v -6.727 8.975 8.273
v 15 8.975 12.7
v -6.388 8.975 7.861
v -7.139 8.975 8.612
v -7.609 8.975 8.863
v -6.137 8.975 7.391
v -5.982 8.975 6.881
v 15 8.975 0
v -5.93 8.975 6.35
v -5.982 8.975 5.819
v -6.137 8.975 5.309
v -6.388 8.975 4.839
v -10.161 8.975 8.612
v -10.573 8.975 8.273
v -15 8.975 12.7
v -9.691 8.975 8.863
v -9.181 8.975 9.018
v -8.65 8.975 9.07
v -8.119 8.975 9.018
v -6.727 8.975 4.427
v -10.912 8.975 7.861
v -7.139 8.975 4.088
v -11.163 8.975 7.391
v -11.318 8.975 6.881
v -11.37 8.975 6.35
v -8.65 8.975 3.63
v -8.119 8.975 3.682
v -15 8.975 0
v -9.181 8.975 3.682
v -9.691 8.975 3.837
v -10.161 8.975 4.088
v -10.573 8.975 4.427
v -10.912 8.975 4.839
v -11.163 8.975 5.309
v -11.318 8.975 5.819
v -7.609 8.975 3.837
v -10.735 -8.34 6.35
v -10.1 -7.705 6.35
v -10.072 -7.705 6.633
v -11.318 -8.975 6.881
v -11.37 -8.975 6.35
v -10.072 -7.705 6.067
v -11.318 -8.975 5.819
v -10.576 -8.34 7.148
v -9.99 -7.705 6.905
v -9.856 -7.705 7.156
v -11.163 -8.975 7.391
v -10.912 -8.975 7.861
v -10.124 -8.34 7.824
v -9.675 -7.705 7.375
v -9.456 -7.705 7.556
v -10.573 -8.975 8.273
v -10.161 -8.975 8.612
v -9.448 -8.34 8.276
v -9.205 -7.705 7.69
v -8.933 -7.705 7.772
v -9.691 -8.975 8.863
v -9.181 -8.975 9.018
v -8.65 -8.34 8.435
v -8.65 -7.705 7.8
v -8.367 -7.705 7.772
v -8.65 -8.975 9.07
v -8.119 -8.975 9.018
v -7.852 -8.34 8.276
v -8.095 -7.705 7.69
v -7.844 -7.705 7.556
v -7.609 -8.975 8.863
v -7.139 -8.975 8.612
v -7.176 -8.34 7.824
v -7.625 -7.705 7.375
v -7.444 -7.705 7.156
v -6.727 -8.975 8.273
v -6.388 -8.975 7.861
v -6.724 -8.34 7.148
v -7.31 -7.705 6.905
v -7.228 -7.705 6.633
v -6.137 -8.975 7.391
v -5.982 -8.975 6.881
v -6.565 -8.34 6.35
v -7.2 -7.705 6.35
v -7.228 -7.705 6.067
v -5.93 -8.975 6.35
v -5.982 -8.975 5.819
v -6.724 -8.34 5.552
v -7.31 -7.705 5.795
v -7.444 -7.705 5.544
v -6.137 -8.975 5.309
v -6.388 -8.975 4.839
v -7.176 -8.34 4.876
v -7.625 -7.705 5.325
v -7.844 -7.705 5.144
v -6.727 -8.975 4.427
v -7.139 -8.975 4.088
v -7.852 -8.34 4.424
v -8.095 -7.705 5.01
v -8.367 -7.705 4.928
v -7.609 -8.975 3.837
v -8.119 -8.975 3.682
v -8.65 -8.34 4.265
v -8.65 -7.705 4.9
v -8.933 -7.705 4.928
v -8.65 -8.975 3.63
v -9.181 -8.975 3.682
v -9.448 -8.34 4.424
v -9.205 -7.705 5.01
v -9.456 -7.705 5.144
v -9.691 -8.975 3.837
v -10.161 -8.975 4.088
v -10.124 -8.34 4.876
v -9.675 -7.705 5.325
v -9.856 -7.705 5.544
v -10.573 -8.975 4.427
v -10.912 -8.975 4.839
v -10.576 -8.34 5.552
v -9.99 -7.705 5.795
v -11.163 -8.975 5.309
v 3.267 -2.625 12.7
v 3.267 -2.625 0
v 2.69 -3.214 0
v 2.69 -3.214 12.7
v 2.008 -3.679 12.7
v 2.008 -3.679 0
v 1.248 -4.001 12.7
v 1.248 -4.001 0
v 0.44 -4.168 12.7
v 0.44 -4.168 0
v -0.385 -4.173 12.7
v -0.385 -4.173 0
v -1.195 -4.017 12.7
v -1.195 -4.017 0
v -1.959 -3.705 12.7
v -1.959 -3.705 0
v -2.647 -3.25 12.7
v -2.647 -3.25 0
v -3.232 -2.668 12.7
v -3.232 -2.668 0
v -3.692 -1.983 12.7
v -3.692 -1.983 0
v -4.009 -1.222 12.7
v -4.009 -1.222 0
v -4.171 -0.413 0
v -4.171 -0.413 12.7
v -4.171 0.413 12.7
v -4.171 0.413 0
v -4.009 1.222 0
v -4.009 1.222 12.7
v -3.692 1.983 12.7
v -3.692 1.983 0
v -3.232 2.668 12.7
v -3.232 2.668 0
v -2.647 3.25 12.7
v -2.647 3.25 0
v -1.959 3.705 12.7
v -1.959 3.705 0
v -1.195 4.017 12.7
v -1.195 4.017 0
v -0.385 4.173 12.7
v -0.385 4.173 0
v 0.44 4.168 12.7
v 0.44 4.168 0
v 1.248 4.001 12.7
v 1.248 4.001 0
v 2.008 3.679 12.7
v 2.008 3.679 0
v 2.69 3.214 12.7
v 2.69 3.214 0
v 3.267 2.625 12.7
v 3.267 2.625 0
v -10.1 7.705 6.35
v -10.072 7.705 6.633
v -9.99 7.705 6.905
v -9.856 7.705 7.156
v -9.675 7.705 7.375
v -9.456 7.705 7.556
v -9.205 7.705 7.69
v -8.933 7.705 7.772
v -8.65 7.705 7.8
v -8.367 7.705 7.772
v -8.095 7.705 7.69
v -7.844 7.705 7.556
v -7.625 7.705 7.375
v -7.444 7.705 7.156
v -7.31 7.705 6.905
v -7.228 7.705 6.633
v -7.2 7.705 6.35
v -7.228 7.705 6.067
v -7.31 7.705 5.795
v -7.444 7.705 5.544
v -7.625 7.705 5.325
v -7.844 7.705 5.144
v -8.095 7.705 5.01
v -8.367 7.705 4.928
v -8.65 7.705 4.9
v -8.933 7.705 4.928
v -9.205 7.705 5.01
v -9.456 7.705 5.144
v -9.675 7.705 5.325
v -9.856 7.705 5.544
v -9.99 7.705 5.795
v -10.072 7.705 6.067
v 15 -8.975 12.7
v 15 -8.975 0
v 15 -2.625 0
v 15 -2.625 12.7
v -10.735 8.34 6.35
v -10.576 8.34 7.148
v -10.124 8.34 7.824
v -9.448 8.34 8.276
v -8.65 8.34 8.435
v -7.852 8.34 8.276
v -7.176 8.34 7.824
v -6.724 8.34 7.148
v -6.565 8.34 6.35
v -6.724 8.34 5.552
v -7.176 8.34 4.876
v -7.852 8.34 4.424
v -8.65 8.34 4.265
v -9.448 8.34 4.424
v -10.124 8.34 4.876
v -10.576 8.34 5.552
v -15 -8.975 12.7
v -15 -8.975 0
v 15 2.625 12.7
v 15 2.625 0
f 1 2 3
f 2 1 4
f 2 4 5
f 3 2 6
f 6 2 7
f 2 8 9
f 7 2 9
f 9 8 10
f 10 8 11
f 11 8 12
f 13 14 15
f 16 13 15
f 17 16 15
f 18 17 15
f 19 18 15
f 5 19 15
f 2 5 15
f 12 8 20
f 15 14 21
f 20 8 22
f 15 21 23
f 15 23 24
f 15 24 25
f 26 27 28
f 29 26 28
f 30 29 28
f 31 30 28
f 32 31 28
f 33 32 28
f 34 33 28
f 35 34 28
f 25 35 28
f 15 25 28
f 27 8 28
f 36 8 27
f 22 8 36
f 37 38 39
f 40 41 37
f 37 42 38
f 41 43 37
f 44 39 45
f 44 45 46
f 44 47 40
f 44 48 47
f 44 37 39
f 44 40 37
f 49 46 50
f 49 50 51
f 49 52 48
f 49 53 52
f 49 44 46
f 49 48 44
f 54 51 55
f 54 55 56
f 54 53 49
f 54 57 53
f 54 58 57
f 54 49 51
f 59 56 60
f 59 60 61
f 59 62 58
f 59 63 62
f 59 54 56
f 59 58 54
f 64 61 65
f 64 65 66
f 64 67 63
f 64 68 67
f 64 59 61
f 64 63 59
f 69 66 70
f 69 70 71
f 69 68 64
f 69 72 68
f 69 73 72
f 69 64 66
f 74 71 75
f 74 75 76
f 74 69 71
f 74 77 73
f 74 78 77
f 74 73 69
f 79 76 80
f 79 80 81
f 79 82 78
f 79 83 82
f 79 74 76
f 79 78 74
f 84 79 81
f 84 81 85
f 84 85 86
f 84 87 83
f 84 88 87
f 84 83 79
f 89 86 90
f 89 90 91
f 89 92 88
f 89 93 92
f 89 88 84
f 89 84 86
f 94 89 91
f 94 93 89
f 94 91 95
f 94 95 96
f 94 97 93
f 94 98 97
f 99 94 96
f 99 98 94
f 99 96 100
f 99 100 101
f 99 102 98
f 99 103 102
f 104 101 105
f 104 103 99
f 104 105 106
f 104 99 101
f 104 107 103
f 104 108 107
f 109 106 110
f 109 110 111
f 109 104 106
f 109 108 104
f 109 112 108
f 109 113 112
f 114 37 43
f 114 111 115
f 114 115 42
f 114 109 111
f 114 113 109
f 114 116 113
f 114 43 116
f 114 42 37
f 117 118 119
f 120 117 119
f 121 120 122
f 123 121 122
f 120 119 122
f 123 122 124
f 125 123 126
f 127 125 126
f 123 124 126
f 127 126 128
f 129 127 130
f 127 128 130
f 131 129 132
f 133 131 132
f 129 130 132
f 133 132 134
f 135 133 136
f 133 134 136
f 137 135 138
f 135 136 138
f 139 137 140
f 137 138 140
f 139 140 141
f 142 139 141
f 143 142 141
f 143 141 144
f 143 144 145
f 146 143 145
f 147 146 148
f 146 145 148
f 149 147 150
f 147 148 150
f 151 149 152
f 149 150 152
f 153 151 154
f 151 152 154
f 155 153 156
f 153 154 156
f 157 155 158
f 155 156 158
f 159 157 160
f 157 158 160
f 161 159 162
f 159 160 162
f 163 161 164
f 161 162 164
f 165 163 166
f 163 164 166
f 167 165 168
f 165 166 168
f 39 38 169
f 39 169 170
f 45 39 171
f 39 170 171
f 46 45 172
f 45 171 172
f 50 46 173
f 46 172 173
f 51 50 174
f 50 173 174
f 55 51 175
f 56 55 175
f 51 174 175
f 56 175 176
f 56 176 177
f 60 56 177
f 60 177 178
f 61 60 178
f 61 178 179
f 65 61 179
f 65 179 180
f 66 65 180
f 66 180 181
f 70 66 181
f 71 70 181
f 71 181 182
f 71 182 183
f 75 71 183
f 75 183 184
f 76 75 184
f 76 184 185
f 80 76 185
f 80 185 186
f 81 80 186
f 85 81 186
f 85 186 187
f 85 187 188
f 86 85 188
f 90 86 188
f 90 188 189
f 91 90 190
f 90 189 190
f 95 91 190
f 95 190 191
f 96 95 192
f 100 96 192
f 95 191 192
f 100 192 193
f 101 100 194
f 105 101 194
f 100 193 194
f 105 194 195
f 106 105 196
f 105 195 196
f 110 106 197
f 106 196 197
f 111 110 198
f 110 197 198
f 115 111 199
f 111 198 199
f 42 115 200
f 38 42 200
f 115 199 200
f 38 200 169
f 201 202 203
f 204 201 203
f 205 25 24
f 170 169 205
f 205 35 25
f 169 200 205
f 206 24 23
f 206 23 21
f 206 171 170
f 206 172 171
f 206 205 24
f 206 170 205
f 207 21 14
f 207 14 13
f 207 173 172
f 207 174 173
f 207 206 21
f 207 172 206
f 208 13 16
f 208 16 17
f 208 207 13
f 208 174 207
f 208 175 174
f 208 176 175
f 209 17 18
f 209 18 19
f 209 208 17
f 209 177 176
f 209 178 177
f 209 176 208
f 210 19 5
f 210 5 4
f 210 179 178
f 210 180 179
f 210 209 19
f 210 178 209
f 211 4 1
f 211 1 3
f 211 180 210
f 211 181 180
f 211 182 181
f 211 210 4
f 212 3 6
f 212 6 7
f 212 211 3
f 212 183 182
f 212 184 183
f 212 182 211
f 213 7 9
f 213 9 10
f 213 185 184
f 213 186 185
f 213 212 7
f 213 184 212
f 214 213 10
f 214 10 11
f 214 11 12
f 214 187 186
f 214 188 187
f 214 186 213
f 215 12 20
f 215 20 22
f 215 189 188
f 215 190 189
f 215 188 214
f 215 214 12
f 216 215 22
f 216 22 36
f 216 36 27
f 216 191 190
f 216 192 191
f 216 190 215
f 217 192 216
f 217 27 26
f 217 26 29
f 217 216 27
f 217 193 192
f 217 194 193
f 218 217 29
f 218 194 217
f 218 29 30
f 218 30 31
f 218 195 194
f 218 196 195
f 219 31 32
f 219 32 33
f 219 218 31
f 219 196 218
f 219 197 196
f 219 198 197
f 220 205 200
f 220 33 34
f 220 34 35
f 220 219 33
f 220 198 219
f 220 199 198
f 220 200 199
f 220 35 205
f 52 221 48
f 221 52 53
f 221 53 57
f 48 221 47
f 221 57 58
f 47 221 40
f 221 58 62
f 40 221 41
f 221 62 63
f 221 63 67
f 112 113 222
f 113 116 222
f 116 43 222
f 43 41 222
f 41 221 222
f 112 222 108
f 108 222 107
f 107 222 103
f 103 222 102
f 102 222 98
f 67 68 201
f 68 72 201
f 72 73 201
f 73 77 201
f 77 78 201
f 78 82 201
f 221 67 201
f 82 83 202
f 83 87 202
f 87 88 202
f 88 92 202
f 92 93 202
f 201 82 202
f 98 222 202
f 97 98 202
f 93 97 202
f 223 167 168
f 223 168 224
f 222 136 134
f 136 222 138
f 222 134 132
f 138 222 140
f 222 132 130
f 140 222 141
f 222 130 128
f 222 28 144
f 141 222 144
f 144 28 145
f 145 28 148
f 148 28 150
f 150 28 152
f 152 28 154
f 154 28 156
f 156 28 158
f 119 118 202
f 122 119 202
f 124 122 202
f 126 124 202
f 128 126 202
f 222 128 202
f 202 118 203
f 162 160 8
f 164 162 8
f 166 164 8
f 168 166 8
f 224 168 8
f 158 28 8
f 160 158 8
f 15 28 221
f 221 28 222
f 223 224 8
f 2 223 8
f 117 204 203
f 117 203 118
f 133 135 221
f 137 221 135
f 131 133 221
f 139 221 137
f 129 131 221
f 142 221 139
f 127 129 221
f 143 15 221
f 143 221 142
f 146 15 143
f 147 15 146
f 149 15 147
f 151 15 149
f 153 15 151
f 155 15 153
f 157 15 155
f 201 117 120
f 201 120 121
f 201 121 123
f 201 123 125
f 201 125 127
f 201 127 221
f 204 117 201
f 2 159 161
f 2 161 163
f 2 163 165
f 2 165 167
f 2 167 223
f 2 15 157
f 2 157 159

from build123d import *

# Parameters (mm, degrees)
F1_DEPTH = 12.7
F2_R     = 1.45
F3_DEPTH = 29.2862
F4_SIZE  = 1.27


with BuildPart() as f1:
    # F0 (on Top) → F1 (new body)
    with BuildSketch(Plane.XY):
        with BuildLine():
            Line((15, 2.625), (15, 8.975))
            Line((15, 8.975), (-15, 8.975))
            Line((-15, 8.975), (-15, -8.975))
            Line((-15, -8.975), (15, -8.975))
            Line((15, -8.975), (15, -2.625))
            Line((15, -2.625), (3.267087, -2.625))
            ThreePointArc((3.267087, -2.625), (-4.191, 0), (3.267087, 2.625))
            Line((3.267087, 2.625), (15, 2.625))
        make_face()
    extrude(amount=F1_DEPTH)

    # F2 (on face) → F3 (cut)
    with BuildSketch(Plane(origin=(0, 8.975, 0), x_dir=(-1, 0, 0), z_dir=(0, 1, 0))):
        with Locations((8.65, 6.35)):
            Circle(F2_R)
    extrude(amount=-F3_DEPTH, mode=Mode.SUBTRACT)

    # F4
    f4_edges = [f1.edges().sort_by_distance(p)[0] for p in [
        (-7.2, 8.975, 6.35),
        (-7.2, -8.975, 6.35),
    ]]
    chamfer(f4_edges, length=F4_SIZE)


solid = f1.part
